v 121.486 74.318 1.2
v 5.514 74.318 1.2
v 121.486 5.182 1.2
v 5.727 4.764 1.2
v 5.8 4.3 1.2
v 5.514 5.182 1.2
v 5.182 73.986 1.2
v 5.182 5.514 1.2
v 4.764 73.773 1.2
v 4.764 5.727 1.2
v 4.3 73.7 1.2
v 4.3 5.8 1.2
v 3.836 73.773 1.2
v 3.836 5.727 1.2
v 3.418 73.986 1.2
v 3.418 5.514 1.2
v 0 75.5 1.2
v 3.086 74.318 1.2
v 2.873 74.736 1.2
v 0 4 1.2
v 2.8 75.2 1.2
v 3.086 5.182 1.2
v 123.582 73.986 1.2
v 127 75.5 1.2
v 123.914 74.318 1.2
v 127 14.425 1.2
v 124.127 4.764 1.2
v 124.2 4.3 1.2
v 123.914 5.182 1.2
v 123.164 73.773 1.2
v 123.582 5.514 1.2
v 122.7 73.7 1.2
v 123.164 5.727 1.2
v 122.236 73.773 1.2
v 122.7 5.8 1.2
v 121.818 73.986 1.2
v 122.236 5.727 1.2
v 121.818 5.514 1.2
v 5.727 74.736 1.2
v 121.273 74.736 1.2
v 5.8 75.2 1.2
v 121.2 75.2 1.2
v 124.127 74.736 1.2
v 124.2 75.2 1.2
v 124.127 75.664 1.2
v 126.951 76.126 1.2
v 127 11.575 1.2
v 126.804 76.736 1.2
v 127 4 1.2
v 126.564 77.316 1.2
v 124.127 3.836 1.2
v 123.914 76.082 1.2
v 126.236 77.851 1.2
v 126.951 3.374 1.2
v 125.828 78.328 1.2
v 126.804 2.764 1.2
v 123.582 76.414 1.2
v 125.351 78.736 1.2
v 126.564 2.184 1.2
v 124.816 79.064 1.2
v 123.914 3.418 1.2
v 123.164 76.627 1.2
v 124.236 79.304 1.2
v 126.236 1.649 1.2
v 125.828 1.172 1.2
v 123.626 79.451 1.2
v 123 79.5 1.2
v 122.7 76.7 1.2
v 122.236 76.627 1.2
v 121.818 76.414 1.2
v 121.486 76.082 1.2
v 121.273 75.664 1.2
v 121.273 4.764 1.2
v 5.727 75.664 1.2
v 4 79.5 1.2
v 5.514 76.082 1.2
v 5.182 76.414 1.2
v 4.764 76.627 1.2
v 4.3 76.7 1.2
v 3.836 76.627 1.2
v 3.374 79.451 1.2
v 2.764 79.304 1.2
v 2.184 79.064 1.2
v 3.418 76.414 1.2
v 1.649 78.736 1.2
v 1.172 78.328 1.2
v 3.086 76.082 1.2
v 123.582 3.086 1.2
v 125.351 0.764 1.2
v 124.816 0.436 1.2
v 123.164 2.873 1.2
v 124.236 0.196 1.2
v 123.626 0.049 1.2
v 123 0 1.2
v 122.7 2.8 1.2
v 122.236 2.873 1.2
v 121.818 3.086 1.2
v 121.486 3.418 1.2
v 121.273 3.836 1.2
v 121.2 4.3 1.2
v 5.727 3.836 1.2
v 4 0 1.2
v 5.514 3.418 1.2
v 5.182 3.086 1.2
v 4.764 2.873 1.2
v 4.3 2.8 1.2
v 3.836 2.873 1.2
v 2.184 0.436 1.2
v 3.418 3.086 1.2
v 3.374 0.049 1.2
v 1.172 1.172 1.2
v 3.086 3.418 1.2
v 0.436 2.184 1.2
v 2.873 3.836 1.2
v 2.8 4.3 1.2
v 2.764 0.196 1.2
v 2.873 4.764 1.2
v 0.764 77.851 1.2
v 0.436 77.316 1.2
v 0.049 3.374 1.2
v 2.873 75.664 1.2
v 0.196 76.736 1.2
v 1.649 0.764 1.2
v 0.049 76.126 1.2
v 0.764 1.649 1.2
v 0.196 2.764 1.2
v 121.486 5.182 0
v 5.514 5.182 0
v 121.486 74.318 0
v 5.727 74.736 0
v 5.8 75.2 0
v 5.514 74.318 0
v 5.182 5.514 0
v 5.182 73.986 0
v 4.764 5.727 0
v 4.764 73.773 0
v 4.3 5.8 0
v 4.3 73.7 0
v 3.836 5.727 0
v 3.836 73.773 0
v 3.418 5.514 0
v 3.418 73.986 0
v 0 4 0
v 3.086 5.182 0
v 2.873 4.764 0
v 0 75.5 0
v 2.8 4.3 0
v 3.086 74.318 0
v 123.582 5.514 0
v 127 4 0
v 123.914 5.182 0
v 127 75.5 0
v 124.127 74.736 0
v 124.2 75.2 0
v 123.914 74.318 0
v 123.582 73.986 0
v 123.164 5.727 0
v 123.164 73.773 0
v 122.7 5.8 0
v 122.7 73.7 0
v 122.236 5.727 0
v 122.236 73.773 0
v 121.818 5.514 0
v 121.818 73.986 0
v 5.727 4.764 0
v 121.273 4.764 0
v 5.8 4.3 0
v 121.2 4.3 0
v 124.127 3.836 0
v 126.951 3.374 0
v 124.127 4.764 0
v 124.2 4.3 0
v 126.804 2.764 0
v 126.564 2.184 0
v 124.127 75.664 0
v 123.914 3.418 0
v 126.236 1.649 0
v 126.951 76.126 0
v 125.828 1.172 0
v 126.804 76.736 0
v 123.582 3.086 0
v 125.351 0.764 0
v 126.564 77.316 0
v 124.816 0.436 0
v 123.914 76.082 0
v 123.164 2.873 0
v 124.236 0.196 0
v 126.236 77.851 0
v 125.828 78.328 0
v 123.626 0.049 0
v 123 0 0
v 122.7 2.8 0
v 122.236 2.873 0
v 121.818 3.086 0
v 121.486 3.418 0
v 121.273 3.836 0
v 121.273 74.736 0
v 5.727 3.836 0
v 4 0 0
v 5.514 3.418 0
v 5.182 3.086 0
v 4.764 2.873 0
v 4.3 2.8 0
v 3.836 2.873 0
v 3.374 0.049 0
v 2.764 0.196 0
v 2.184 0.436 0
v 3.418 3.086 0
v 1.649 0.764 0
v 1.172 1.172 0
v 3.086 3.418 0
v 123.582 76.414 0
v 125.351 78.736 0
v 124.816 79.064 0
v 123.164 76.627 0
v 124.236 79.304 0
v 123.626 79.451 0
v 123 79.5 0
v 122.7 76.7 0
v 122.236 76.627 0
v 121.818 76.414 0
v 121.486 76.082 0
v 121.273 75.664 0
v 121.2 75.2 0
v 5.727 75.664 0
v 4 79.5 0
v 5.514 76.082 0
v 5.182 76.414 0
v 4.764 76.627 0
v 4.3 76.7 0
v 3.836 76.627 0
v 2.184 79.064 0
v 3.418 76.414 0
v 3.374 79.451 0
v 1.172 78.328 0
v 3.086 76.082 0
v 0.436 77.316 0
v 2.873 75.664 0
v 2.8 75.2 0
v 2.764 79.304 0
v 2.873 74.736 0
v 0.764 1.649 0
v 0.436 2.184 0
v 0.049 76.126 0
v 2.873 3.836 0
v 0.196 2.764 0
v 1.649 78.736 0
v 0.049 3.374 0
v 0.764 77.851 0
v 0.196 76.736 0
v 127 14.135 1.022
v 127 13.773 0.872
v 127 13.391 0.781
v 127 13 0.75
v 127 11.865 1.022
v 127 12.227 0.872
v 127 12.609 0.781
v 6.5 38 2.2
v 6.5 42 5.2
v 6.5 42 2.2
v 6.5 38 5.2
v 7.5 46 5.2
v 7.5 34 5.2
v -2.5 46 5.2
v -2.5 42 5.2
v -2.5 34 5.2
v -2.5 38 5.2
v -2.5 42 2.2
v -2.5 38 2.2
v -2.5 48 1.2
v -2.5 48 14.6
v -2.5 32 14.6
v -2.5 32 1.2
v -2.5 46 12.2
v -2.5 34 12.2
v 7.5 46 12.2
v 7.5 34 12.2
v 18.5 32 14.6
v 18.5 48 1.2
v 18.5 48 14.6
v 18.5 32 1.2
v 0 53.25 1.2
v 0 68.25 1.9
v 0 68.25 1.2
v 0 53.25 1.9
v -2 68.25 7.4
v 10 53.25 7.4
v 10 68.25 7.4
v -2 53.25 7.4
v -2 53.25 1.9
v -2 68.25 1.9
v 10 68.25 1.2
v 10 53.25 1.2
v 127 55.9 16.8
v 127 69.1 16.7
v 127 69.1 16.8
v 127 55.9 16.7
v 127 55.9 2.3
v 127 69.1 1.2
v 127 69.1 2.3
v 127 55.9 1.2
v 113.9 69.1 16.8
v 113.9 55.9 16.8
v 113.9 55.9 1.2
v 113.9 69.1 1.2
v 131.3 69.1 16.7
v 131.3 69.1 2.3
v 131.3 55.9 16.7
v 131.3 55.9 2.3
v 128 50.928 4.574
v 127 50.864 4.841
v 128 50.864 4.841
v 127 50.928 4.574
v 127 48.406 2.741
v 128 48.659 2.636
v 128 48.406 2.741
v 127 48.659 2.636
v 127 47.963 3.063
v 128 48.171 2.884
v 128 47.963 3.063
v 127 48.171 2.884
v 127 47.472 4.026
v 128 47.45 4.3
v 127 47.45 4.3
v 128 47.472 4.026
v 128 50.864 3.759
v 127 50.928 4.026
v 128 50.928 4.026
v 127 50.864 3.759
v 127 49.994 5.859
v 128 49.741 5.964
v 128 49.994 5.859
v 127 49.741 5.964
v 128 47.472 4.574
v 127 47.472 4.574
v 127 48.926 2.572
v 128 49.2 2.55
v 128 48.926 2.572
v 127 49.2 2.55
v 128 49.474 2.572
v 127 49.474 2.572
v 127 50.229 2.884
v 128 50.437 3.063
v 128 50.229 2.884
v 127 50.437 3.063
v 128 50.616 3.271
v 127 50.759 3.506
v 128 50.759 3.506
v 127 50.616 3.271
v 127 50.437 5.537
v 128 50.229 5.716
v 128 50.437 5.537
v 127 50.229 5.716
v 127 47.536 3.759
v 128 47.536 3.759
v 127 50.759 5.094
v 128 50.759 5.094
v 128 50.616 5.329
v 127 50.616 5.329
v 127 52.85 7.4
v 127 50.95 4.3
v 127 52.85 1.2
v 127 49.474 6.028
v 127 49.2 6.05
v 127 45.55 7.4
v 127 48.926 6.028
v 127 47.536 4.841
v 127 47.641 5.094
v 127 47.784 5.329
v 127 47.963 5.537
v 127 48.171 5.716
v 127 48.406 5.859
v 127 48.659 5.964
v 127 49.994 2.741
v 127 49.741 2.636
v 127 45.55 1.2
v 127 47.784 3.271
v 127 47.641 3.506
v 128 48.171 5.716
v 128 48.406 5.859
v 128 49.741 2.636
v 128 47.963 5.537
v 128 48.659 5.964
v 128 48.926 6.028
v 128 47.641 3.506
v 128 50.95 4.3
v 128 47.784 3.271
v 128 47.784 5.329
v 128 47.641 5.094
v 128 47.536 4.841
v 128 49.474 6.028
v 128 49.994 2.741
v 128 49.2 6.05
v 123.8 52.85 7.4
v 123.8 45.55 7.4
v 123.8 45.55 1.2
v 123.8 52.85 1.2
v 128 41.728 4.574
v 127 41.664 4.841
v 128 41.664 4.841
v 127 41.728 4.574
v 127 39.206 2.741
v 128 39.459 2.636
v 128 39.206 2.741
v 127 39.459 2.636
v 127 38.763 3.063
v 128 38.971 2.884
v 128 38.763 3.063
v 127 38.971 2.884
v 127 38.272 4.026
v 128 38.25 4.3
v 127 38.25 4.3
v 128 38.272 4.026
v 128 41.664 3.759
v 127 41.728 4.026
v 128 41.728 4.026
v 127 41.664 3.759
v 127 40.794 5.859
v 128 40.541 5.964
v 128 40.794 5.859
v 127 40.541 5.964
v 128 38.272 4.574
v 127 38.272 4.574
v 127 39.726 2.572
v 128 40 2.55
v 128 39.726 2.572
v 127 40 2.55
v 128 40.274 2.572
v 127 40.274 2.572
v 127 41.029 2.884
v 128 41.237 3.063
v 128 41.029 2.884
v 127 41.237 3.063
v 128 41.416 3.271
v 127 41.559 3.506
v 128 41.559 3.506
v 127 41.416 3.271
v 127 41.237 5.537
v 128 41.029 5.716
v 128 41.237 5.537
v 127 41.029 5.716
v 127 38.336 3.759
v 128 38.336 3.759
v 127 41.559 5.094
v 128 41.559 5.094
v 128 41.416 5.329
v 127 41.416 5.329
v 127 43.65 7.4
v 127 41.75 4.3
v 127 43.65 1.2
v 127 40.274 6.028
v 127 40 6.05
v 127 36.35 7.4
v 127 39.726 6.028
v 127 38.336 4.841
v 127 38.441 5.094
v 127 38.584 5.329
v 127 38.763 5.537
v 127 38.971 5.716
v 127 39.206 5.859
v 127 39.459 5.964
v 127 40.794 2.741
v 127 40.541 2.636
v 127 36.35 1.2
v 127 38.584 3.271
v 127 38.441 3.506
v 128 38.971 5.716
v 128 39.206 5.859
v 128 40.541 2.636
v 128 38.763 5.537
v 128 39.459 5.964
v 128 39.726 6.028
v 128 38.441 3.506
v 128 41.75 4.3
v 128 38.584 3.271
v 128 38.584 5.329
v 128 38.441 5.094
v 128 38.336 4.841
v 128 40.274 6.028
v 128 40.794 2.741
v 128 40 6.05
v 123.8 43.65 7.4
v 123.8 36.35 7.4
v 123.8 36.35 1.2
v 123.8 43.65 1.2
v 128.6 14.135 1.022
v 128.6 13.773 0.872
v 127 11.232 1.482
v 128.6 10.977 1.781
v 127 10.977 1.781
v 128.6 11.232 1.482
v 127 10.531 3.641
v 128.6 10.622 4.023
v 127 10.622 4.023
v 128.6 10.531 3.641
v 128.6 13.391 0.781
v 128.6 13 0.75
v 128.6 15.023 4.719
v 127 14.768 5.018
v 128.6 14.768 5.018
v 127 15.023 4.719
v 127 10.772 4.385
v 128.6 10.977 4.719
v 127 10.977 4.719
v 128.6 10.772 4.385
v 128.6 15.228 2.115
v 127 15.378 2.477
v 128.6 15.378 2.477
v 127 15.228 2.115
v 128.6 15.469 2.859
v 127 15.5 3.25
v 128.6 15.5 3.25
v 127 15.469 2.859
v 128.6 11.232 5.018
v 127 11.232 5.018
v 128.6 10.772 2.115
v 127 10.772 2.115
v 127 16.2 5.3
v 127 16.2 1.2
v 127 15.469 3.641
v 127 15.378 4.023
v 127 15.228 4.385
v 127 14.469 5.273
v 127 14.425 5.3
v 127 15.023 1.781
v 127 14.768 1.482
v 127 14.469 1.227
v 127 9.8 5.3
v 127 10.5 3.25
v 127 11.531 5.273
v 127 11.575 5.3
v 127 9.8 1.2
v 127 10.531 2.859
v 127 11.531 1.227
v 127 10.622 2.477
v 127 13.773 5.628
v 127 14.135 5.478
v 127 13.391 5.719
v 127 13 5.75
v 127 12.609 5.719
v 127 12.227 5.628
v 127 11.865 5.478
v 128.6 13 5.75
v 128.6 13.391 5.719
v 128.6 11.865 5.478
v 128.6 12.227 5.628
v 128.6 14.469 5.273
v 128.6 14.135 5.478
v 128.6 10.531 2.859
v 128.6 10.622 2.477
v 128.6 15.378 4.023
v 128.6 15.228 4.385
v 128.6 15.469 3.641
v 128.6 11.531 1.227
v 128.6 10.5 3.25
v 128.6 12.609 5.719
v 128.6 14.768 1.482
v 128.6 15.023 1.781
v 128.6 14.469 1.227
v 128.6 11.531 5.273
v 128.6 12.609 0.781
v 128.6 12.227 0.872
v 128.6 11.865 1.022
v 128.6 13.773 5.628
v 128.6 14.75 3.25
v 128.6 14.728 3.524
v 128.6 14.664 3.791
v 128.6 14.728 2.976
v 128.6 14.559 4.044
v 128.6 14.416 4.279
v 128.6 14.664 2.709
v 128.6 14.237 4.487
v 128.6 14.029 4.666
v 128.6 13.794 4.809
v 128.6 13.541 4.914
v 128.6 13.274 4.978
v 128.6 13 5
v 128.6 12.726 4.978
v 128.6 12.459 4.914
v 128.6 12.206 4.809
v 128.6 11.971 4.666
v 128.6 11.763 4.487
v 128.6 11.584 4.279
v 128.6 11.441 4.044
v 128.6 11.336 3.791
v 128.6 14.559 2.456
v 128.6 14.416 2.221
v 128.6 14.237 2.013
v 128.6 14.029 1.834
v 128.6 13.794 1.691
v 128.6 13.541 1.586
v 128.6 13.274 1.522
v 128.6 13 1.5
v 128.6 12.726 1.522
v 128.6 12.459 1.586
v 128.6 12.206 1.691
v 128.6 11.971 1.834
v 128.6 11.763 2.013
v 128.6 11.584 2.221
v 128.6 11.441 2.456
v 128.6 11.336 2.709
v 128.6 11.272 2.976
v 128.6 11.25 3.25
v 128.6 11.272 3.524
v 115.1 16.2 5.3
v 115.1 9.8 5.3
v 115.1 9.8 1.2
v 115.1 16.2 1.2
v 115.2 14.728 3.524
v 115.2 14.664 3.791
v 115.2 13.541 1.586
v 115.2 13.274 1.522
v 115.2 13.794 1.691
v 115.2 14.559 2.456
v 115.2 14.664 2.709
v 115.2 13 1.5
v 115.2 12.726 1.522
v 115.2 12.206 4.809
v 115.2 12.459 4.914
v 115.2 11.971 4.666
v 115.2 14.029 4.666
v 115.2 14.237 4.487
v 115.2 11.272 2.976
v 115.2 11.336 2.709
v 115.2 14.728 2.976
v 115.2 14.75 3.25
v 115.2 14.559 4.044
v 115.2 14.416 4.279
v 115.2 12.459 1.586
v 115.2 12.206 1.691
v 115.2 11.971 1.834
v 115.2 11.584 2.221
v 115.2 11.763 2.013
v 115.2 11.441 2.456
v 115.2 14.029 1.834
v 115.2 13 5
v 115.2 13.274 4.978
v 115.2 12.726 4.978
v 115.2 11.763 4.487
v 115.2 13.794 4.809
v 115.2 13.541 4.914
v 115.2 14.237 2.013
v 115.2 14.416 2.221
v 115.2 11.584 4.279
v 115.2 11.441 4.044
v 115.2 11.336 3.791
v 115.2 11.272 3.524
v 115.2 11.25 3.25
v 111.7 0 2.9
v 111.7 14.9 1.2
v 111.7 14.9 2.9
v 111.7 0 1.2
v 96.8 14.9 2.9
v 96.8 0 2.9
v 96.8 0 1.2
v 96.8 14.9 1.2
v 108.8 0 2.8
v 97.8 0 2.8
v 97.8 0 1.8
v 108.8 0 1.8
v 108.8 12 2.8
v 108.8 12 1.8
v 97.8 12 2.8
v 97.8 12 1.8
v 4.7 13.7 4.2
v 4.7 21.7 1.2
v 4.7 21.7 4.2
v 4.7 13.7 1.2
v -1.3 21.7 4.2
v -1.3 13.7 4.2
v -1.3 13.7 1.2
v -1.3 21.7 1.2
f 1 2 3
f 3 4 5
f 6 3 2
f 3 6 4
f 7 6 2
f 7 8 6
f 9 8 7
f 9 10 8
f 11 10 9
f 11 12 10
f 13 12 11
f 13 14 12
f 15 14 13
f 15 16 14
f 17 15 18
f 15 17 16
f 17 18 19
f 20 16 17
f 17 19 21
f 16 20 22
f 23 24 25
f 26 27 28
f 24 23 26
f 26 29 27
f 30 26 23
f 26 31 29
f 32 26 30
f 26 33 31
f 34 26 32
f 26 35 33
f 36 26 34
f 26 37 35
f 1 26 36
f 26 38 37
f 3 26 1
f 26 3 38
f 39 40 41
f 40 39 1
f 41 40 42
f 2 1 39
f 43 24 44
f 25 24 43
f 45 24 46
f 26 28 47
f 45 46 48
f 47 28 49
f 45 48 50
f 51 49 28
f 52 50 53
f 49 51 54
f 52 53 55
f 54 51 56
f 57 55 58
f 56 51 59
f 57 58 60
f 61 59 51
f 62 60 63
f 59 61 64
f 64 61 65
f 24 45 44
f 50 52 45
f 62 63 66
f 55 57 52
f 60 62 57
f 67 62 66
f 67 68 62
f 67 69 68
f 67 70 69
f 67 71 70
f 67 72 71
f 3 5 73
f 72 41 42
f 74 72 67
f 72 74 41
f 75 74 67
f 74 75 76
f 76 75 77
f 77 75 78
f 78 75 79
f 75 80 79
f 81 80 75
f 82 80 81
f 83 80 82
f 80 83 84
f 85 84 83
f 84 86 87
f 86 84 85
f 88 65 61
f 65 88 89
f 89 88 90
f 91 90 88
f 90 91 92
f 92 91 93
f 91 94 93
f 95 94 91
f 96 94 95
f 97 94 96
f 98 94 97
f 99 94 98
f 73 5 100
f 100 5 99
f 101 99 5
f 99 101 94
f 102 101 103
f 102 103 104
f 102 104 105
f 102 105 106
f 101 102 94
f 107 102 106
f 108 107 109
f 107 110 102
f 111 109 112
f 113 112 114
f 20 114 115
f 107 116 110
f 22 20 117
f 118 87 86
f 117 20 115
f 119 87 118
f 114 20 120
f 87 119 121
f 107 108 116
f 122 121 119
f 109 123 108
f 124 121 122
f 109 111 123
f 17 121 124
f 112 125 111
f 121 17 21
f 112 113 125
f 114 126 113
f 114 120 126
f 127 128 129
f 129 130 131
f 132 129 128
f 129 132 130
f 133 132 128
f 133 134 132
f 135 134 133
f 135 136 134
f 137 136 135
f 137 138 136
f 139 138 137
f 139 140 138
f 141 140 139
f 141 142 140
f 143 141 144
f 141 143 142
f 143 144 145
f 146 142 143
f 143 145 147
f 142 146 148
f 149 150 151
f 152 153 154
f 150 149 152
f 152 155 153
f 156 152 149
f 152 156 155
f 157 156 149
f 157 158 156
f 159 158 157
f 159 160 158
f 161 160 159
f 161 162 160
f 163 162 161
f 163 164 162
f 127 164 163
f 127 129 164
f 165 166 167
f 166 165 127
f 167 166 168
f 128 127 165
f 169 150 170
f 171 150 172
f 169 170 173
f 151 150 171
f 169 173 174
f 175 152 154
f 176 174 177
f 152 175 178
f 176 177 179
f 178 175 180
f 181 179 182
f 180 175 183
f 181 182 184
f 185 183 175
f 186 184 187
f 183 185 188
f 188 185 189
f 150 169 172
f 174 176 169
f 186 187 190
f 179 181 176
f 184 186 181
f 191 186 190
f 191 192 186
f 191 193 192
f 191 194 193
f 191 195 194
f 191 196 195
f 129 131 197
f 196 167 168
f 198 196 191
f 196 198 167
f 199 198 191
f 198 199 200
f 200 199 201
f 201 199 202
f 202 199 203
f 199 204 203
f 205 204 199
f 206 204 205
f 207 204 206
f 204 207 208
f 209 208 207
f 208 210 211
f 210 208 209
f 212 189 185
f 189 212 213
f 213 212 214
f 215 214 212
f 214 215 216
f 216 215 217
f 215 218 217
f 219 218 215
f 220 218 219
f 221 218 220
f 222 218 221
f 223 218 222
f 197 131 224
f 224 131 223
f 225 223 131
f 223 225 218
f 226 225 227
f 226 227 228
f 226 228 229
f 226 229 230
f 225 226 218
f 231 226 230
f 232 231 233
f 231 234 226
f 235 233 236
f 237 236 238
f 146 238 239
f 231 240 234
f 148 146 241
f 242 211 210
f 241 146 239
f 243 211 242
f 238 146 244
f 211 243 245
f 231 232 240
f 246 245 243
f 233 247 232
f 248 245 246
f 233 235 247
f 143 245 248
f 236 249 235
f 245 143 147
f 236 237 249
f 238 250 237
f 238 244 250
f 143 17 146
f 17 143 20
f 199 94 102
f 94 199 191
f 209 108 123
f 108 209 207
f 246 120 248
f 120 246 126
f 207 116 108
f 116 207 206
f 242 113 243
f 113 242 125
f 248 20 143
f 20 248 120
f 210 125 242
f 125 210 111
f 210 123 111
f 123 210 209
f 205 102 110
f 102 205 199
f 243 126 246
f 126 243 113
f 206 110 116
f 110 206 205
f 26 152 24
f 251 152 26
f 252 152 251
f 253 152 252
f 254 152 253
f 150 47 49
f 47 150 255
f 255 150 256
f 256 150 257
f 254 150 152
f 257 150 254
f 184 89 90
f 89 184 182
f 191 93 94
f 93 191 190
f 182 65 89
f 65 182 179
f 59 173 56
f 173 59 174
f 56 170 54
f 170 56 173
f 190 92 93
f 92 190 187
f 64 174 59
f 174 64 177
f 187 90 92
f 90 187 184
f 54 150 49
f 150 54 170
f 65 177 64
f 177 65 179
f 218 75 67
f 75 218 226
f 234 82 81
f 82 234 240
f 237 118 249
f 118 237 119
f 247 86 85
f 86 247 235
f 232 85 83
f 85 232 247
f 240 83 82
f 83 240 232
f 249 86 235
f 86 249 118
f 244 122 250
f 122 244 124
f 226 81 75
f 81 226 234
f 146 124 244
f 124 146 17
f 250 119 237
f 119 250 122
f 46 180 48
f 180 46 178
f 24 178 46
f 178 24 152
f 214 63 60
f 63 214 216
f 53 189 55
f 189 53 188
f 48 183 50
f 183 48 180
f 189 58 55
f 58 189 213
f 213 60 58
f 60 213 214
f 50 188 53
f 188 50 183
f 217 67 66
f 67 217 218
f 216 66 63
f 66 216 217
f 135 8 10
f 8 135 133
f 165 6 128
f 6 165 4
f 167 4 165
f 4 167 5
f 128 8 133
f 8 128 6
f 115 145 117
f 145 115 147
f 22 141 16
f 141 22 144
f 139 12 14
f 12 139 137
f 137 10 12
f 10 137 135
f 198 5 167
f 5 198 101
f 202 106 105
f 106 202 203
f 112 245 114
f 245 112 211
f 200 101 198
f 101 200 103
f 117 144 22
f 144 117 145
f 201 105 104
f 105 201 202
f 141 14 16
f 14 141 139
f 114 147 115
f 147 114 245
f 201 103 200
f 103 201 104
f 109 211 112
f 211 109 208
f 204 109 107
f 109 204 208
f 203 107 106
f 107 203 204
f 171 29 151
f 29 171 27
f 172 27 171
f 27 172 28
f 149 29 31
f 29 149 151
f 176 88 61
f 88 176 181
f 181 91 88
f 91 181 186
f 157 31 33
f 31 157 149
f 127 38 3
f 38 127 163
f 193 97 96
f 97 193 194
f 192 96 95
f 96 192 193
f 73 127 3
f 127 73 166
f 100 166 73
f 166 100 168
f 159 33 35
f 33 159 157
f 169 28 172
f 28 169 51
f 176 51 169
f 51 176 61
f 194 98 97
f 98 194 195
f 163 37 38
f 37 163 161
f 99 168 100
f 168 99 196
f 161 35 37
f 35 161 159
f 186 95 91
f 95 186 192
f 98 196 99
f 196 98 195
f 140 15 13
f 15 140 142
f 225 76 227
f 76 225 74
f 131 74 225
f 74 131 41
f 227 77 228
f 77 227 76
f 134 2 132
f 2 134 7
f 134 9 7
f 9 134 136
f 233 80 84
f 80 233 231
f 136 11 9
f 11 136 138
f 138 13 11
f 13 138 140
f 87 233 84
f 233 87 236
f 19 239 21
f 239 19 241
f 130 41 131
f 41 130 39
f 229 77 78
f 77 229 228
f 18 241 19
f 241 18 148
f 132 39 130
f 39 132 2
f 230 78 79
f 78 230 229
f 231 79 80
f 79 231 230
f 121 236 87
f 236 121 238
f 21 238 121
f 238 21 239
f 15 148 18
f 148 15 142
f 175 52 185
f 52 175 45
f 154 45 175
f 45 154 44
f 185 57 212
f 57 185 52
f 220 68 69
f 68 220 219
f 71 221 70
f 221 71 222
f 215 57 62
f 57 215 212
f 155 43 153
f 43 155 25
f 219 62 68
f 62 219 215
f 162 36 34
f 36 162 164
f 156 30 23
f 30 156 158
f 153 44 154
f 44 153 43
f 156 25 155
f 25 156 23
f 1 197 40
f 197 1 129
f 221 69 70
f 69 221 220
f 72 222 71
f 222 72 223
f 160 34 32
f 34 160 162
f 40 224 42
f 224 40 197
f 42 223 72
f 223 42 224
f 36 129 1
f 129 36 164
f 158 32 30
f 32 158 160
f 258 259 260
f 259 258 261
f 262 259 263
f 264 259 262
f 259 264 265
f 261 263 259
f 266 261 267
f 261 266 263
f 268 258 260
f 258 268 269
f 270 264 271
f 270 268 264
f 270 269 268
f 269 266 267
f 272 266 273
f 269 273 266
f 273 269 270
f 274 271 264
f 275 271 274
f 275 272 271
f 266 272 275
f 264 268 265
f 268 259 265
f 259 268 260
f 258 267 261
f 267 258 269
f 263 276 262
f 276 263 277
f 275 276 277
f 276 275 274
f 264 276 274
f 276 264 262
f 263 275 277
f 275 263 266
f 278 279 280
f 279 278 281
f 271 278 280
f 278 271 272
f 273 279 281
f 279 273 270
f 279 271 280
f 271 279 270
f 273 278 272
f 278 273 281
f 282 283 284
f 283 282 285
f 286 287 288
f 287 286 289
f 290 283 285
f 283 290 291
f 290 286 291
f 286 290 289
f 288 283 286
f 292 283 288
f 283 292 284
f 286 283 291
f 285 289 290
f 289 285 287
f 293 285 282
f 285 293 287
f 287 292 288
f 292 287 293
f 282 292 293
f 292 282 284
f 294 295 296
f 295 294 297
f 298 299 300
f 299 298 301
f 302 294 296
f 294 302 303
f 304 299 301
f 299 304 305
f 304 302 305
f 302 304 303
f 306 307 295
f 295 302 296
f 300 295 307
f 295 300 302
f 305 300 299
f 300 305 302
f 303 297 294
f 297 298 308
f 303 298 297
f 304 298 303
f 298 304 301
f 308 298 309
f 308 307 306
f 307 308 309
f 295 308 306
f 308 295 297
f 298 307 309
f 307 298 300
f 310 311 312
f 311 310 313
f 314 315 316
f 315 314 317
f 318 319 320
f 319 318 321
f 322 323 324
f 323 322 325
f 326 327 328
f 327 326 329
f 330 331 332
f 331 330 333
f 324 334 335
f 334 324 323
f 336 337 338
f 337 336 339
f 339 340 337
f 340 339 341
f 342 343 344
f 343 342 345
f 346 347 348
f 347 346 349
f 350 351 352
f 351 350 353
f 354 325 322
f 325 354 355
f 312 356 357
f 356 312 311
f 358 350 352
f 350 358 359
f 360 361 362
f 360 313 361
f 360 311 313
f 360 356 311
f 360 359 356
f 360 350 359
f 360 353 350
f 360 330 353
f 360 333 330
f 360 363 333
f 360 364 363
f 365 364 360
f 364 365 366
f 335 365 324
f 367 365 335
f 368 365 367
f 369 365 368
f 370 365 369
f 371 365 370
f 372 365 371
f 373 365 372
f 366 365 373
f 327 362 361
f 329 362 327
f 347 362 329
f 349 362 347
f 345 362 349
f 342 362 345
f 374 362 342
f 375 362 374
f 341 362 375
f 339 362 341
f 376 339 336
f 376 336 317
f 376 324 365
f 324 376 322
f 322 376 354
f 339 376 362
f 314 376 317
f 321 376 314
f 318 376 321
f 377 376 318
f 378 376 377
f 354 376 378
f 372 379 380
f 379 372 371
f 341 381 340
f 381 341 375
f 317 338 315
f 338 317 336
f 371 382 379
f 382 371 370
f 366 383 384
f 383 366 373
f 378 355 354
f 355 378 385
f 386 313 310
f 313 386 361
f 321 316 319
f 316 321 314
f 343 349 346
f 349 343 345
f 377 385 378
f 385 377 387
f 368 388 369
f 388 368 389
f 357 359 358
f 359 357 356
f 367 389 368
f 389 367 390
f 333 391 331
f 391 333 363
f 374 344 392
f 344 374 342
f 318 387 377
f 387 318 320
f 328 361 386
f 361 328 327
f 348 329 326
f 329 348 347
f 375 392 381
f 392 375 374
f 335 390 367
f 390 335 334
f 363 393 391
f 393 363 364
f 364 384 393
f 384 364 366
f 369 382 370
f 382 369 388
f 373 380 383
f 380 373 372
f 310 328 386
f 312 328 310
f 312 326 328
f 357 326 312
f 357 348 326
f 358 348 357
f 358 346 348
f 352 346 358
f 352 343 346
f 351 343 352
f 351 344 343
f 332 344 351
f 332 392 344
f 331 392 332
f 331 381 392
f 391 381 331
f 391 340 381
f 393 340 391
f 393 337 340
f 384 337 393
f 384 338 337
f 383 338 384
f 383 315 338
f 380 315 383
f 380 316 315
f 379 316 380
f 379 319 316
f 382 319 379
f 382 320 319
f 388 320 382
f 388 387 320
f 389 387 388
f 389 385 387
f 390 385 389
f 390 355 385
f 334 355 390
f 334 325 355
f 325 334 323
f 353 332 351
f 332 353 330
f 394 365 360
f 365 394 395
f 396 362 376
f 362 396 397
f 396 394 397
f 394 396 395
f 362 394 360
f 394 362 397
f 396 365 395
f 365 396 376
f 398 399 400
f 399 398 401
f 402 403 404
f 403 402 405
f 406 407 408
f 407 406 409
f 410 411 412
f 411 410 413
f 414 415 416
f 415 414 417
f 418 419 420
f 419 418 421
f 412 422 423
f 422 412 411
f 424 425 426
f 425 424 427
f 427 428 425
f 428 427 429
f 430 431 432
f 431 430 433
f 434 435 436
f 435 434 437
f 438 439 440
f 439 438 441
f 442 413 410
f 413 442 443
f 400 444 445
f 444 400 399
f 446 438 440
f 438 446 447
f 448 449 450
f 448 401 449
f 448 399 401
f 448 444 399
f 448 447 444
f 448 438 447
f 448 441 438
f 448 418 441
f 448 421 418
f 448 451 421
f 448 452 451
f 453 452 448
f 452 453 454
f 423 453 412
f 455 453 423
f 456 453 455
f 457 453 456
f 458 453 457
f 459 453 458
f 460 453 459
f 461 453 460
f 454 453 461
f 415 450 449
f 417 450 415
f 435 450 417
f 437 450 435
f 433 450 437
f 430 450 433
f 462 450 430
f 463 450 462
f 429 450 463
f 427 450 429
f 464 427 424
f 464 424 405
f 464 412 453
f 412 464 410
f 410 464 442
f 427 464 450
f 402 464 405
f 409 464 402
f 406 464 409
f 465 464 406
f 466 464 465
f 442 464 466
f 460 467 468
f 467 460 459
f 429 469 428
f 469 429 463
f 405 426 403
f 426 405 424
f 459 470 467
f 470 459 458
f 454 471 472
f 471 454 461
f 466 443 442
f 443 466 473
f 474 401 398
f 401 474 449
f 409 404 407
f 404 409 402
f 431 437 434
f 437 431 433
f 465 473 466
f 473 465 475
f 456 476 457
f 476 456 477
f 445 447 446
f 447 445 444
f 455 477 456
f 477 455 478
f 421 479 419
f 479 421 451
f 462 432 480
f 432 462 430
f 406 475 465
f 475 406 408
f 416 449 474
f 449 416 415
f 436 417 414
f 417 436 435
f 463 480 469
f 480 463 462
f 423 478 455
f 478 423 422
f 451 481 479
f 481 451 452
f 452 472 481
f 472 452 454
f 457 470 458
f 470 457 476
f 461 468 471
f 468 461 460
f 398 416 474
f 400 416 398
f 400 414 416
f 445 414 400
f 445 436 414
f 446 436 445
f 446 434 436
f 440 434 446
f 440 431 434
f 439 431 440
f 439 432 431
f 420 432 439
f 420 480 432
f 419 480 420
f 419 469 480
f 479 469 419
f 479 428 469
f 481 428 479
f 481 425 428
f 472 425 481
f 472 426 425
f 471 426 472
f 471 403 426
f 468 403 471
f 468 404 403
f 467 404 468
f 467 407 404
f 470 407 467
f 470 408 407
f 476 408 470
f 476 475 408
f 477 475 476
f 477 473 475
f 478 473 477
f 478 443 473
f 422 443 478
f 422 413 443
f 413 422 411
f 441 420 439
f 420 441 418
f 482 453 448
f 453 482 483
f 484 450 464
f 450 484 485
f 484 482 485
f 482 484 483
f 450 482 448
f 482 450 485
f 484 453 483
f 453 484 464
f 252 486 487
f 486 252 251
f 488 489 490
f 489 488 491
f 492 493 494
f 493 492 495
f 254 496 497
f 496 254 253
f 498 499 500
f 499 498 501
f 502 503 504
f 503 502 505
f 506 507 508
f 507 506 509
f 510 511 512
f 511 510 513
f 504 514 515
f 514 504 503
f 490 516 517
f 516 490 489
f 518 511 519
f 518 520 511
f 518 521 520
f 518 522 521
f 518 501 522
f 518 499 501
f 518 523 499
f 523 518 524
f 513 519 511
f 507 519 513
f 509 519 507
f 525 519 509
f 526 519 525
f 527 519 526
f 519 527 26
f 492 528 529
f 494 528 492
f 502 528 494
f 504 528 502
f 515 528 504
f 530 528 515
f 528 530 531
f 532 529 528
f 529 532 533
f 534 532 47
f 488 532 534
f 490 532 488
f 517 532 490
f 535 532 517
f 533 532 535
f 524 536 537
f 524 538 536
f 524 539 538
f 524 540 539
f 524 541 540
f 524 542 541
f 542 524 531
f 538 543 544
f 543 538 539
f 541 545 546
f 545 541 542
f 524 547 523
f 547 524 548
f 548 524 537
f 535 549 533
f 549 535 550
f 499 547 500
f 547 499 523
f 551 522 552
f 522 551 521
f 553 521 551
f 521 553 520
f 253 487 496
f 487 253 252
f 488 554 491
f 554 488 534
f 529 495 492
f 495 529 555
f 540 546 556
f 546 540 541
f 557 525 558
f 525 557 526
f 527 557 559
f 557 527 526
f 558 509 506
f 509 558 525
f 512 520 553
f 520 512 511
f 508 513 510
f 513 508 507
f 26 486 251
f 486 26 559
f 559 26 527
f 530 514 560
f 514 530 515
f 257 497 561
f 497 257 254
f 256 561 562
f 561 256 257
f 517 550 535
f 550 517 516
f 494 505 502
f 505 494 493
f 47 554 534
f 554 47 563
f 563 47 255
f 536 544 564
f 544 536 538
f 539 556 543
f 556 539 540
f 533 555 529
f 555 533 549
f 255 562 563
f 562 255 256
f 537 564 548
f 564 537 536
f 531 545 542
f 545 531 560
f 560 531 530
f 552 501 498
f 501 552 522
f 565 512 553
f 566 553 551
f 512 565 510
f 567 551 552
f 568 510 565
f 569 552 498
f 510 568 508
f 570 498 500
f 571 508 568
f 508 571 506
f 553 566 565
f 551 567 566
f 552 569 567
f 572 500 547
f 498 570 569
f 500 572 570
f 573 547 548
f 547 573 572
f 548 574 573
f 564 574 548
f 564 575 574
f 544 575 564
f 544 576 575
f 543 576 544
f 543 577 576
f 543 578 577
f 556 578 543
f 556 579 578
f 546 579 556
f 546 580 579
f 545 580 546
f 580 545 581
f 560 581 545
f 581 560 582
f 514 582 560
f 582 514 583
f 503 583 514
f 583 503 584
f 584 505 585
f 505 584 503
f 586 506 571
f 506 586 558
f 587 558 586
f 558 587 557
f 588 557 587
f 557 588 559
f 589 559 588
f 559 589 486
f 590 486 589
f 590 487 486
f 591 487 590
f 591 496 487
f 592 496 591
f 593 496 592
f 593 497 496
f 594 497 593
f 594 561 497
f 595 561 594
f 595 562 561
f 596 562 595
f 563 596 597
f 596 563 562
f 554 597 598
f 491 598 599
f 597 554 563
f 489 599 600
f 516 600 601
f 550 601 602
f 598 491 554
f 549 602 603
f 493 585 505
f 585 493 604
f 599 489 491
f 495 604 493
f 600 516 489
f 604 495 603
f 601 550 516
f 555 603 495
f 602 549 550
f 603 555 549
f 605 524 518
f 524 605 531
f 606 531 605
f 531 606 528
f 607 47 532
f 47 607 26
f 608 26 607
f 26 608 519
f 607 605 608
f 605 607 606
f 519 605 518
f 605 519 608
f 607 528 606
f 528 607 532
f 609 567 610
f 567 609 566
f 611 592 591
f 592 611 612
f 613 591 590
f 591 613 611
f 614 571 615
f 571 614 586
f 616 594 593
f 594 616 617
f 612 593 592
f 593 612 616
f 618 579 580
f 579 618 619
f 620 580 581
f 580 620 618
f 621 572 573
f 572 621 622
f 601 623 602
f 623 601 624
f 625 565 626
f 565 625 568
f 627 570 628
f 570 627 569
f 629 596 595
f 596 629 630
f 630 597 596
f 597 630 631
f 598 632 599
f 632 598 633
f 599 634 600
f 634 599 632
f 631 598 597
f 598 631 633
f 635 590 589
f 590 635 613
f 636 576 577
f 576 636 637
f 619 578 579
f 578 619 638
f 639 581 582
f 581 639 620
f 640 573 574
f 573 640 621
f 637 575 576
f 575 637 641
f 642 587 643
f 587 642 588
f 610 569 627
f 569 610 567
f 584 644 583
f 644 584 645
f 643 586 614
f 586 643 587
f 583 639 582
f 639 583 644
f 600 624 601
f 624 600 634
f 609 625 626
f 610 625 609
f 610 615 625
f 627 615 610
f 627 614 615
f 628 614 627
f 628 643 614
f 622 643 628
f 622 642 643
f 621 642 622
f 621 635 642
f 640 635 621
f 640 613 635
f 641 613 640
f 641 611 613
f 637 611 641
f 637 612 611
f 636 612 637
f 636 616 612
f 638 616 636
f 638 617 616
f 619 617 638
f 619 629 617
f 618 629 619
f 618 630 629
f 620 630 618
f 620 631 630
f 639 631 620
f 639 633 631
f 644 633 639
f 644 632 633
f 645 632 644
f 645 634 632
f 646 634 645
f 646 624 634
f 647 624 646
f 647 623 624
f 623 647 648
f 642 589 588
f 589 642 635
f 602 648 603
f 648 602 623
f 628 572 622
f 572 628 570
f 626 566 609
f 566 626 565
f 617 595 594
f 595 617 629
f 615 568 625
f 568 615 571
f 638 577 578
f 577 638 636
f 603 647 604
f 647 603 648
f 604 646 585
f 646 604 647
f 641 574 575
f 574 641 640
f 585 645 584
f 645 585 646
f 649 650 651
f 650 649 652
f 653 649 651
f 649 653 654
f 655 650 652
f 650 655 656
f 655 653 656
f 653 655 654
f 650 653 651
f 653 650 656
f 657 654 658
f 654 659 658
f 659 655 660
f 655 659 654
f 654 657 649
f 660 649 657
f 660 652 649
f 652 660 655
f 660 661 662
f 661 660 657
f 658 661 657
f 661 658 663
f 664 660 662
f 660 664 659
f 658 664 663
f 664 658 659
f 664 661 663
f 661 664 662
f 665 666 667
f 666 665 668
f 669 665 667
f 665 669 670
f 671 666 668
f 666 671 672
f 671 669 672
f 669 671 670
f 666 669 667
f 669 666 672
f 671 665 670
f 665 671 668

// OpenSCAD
module rounded_corner(corner_x,corner_y, corner_type)
{
    //rounded corner
  translate([corner_x, corner_y, 0]) { 
    if (corner_type == 0) {
      difference() {
        cube([4,4,1.2], false);
        translate([4,4,0]) {
          cylinder($fn=40, h=1.2, r=4, centre=false);
        }
      }
    } else if (corner_type == 1) {
      difference() {
        translate([-4,0,0]) {
          cube([4,4,1.2], false);
        }
        translate([-4,4,0]) {
          cylinder($fn=40, h=1.2, r=4, centre=false);
        }
      }
    } else if (corner_type == 2) {
      difference() {
        translate([0,-4,0]) {
          cube([4,4,1.2], false);
        }
        translate([4,-4,0]) {
          cylinder($fn=40, h=1.2, r=4, centre=false);
        }
      }
    } else if (corner_type == 3) {
      difference() {
        translate([-4,-4,0]) {
          cube([4,4,1.2], false);
        }
        translate([-4,-4,0]) {
          cylinder($fn=40, h=1.2, r=4, centre=false);
        }
      }
    }
  }
}

module pcb()
{
  color("Green") {
    difference() {
      cube([127,79.5,1.2] , false);
      rounded_corner(0, 0, 0);
      rounded_corner(127, 0, 1);
      rounded_corner(0, 79.5, 2);
      rounded_corner(127, 79.5, 3);

      translate([4.3,4.3,0]) {
        cylinder($fn=20, h=1.2, r=3/2, center=false);
      }
      translate([122.7,4.3,0]) {
        cylinder($fn=20, h=1.2, r=3/2, center=false);
      }
      translate([4.3, 75.2,0]) {
        cylinder($fn=20, h=1.2, r=3/2, center=false);
      }
      translate([122.7,75.2,0]) {
        cylinder($fn=20, h=1.2, r=3/2, center=false);
      }
    }
  }
}

module connectors()
{
  color("red") {
    translate([0,0,1.2]) {
      //micro usb power
      translate([-1.3, 13.7, 0]) {
        cube([6, 8, 3], false);
      }

      //ethernet
      translate([-2.5, 32, 0]) {
        difference() {
          cube([21, 16, 13.4], false);
          union() {
            translate([0, 6, 1]) {
              cube([9, 4, 3], false);
            }
            translate([0, 2, 4]) {
              cube([10, 12, 7], false);
            }
          }
        }
        
      }

      //hdmi
      translate([-2, 53.25, 0]) {
        union() {
          translate([0, 0, 0.7]) {
            cube([2, 15, 5.5], false);
          }
          translate([2, 0, 0]) {
            cube([10, 15, 6.2], false);
          }
        }
      }

      //USB
      translate([113.9, 55.9, 0]) {
        union() {
          cube([13.1, 13.2, 15.6], false);
          translate([13.1, 0, 1.1]) {
            cube([4.3, 13.2, 14.4], false);
          }
        }
      }



      //reset
      translate([123.8, 45.55, 0]) {        
        union() {
          translate([3.2, 7.3/2, 3.1]) {
            rotate([0,90,0]) {
              cylinder($fn=40, h=1, r=3.5/2, center=false);
            }
          }
          cube([3.2, 7.3, 6.2], false);
        }
      }
    
      //power
      translate([123.8, 36.35, 0]) {        
        union() {
          translate([3.2, 7.3/2, 3.1]) {
            rotate([0,90,0]) {
              cylinder($fn=40, h=1, r=3.5/2, center=false);
            }
          }
          cube([3.2, 7.3, 6.2], false);
        }
      }


      //Audio
      translate([115.1, 9.8, 0]) {
        difference() {
          union() {
            translate([11.9, 3.2, 2.05]) {
              rotate([0,90,0]) {
                cylinder($fn=40, h=1.6, r=5/2, center=false);
              }
            }
            cube([11.9, 6.4, 4.1], false);
          }
          translate([0.1,3.2,2.05]) {
            rotate([0,90,0]) {
              cylinder($fn=40, h=13.5, r=3.5/2, center=false);
            }
          }
        }
      }
    

      //micro SD
      translate([96.8, 0, 0]) {
        difference() {
          cube([14.9, 14.9, 1.7], false);
          translate([1, 0, 0.6]) {
            cube([11, 12, 1], false);
          }
        }
      }




    }
  }
}

pcb();
connectors();
